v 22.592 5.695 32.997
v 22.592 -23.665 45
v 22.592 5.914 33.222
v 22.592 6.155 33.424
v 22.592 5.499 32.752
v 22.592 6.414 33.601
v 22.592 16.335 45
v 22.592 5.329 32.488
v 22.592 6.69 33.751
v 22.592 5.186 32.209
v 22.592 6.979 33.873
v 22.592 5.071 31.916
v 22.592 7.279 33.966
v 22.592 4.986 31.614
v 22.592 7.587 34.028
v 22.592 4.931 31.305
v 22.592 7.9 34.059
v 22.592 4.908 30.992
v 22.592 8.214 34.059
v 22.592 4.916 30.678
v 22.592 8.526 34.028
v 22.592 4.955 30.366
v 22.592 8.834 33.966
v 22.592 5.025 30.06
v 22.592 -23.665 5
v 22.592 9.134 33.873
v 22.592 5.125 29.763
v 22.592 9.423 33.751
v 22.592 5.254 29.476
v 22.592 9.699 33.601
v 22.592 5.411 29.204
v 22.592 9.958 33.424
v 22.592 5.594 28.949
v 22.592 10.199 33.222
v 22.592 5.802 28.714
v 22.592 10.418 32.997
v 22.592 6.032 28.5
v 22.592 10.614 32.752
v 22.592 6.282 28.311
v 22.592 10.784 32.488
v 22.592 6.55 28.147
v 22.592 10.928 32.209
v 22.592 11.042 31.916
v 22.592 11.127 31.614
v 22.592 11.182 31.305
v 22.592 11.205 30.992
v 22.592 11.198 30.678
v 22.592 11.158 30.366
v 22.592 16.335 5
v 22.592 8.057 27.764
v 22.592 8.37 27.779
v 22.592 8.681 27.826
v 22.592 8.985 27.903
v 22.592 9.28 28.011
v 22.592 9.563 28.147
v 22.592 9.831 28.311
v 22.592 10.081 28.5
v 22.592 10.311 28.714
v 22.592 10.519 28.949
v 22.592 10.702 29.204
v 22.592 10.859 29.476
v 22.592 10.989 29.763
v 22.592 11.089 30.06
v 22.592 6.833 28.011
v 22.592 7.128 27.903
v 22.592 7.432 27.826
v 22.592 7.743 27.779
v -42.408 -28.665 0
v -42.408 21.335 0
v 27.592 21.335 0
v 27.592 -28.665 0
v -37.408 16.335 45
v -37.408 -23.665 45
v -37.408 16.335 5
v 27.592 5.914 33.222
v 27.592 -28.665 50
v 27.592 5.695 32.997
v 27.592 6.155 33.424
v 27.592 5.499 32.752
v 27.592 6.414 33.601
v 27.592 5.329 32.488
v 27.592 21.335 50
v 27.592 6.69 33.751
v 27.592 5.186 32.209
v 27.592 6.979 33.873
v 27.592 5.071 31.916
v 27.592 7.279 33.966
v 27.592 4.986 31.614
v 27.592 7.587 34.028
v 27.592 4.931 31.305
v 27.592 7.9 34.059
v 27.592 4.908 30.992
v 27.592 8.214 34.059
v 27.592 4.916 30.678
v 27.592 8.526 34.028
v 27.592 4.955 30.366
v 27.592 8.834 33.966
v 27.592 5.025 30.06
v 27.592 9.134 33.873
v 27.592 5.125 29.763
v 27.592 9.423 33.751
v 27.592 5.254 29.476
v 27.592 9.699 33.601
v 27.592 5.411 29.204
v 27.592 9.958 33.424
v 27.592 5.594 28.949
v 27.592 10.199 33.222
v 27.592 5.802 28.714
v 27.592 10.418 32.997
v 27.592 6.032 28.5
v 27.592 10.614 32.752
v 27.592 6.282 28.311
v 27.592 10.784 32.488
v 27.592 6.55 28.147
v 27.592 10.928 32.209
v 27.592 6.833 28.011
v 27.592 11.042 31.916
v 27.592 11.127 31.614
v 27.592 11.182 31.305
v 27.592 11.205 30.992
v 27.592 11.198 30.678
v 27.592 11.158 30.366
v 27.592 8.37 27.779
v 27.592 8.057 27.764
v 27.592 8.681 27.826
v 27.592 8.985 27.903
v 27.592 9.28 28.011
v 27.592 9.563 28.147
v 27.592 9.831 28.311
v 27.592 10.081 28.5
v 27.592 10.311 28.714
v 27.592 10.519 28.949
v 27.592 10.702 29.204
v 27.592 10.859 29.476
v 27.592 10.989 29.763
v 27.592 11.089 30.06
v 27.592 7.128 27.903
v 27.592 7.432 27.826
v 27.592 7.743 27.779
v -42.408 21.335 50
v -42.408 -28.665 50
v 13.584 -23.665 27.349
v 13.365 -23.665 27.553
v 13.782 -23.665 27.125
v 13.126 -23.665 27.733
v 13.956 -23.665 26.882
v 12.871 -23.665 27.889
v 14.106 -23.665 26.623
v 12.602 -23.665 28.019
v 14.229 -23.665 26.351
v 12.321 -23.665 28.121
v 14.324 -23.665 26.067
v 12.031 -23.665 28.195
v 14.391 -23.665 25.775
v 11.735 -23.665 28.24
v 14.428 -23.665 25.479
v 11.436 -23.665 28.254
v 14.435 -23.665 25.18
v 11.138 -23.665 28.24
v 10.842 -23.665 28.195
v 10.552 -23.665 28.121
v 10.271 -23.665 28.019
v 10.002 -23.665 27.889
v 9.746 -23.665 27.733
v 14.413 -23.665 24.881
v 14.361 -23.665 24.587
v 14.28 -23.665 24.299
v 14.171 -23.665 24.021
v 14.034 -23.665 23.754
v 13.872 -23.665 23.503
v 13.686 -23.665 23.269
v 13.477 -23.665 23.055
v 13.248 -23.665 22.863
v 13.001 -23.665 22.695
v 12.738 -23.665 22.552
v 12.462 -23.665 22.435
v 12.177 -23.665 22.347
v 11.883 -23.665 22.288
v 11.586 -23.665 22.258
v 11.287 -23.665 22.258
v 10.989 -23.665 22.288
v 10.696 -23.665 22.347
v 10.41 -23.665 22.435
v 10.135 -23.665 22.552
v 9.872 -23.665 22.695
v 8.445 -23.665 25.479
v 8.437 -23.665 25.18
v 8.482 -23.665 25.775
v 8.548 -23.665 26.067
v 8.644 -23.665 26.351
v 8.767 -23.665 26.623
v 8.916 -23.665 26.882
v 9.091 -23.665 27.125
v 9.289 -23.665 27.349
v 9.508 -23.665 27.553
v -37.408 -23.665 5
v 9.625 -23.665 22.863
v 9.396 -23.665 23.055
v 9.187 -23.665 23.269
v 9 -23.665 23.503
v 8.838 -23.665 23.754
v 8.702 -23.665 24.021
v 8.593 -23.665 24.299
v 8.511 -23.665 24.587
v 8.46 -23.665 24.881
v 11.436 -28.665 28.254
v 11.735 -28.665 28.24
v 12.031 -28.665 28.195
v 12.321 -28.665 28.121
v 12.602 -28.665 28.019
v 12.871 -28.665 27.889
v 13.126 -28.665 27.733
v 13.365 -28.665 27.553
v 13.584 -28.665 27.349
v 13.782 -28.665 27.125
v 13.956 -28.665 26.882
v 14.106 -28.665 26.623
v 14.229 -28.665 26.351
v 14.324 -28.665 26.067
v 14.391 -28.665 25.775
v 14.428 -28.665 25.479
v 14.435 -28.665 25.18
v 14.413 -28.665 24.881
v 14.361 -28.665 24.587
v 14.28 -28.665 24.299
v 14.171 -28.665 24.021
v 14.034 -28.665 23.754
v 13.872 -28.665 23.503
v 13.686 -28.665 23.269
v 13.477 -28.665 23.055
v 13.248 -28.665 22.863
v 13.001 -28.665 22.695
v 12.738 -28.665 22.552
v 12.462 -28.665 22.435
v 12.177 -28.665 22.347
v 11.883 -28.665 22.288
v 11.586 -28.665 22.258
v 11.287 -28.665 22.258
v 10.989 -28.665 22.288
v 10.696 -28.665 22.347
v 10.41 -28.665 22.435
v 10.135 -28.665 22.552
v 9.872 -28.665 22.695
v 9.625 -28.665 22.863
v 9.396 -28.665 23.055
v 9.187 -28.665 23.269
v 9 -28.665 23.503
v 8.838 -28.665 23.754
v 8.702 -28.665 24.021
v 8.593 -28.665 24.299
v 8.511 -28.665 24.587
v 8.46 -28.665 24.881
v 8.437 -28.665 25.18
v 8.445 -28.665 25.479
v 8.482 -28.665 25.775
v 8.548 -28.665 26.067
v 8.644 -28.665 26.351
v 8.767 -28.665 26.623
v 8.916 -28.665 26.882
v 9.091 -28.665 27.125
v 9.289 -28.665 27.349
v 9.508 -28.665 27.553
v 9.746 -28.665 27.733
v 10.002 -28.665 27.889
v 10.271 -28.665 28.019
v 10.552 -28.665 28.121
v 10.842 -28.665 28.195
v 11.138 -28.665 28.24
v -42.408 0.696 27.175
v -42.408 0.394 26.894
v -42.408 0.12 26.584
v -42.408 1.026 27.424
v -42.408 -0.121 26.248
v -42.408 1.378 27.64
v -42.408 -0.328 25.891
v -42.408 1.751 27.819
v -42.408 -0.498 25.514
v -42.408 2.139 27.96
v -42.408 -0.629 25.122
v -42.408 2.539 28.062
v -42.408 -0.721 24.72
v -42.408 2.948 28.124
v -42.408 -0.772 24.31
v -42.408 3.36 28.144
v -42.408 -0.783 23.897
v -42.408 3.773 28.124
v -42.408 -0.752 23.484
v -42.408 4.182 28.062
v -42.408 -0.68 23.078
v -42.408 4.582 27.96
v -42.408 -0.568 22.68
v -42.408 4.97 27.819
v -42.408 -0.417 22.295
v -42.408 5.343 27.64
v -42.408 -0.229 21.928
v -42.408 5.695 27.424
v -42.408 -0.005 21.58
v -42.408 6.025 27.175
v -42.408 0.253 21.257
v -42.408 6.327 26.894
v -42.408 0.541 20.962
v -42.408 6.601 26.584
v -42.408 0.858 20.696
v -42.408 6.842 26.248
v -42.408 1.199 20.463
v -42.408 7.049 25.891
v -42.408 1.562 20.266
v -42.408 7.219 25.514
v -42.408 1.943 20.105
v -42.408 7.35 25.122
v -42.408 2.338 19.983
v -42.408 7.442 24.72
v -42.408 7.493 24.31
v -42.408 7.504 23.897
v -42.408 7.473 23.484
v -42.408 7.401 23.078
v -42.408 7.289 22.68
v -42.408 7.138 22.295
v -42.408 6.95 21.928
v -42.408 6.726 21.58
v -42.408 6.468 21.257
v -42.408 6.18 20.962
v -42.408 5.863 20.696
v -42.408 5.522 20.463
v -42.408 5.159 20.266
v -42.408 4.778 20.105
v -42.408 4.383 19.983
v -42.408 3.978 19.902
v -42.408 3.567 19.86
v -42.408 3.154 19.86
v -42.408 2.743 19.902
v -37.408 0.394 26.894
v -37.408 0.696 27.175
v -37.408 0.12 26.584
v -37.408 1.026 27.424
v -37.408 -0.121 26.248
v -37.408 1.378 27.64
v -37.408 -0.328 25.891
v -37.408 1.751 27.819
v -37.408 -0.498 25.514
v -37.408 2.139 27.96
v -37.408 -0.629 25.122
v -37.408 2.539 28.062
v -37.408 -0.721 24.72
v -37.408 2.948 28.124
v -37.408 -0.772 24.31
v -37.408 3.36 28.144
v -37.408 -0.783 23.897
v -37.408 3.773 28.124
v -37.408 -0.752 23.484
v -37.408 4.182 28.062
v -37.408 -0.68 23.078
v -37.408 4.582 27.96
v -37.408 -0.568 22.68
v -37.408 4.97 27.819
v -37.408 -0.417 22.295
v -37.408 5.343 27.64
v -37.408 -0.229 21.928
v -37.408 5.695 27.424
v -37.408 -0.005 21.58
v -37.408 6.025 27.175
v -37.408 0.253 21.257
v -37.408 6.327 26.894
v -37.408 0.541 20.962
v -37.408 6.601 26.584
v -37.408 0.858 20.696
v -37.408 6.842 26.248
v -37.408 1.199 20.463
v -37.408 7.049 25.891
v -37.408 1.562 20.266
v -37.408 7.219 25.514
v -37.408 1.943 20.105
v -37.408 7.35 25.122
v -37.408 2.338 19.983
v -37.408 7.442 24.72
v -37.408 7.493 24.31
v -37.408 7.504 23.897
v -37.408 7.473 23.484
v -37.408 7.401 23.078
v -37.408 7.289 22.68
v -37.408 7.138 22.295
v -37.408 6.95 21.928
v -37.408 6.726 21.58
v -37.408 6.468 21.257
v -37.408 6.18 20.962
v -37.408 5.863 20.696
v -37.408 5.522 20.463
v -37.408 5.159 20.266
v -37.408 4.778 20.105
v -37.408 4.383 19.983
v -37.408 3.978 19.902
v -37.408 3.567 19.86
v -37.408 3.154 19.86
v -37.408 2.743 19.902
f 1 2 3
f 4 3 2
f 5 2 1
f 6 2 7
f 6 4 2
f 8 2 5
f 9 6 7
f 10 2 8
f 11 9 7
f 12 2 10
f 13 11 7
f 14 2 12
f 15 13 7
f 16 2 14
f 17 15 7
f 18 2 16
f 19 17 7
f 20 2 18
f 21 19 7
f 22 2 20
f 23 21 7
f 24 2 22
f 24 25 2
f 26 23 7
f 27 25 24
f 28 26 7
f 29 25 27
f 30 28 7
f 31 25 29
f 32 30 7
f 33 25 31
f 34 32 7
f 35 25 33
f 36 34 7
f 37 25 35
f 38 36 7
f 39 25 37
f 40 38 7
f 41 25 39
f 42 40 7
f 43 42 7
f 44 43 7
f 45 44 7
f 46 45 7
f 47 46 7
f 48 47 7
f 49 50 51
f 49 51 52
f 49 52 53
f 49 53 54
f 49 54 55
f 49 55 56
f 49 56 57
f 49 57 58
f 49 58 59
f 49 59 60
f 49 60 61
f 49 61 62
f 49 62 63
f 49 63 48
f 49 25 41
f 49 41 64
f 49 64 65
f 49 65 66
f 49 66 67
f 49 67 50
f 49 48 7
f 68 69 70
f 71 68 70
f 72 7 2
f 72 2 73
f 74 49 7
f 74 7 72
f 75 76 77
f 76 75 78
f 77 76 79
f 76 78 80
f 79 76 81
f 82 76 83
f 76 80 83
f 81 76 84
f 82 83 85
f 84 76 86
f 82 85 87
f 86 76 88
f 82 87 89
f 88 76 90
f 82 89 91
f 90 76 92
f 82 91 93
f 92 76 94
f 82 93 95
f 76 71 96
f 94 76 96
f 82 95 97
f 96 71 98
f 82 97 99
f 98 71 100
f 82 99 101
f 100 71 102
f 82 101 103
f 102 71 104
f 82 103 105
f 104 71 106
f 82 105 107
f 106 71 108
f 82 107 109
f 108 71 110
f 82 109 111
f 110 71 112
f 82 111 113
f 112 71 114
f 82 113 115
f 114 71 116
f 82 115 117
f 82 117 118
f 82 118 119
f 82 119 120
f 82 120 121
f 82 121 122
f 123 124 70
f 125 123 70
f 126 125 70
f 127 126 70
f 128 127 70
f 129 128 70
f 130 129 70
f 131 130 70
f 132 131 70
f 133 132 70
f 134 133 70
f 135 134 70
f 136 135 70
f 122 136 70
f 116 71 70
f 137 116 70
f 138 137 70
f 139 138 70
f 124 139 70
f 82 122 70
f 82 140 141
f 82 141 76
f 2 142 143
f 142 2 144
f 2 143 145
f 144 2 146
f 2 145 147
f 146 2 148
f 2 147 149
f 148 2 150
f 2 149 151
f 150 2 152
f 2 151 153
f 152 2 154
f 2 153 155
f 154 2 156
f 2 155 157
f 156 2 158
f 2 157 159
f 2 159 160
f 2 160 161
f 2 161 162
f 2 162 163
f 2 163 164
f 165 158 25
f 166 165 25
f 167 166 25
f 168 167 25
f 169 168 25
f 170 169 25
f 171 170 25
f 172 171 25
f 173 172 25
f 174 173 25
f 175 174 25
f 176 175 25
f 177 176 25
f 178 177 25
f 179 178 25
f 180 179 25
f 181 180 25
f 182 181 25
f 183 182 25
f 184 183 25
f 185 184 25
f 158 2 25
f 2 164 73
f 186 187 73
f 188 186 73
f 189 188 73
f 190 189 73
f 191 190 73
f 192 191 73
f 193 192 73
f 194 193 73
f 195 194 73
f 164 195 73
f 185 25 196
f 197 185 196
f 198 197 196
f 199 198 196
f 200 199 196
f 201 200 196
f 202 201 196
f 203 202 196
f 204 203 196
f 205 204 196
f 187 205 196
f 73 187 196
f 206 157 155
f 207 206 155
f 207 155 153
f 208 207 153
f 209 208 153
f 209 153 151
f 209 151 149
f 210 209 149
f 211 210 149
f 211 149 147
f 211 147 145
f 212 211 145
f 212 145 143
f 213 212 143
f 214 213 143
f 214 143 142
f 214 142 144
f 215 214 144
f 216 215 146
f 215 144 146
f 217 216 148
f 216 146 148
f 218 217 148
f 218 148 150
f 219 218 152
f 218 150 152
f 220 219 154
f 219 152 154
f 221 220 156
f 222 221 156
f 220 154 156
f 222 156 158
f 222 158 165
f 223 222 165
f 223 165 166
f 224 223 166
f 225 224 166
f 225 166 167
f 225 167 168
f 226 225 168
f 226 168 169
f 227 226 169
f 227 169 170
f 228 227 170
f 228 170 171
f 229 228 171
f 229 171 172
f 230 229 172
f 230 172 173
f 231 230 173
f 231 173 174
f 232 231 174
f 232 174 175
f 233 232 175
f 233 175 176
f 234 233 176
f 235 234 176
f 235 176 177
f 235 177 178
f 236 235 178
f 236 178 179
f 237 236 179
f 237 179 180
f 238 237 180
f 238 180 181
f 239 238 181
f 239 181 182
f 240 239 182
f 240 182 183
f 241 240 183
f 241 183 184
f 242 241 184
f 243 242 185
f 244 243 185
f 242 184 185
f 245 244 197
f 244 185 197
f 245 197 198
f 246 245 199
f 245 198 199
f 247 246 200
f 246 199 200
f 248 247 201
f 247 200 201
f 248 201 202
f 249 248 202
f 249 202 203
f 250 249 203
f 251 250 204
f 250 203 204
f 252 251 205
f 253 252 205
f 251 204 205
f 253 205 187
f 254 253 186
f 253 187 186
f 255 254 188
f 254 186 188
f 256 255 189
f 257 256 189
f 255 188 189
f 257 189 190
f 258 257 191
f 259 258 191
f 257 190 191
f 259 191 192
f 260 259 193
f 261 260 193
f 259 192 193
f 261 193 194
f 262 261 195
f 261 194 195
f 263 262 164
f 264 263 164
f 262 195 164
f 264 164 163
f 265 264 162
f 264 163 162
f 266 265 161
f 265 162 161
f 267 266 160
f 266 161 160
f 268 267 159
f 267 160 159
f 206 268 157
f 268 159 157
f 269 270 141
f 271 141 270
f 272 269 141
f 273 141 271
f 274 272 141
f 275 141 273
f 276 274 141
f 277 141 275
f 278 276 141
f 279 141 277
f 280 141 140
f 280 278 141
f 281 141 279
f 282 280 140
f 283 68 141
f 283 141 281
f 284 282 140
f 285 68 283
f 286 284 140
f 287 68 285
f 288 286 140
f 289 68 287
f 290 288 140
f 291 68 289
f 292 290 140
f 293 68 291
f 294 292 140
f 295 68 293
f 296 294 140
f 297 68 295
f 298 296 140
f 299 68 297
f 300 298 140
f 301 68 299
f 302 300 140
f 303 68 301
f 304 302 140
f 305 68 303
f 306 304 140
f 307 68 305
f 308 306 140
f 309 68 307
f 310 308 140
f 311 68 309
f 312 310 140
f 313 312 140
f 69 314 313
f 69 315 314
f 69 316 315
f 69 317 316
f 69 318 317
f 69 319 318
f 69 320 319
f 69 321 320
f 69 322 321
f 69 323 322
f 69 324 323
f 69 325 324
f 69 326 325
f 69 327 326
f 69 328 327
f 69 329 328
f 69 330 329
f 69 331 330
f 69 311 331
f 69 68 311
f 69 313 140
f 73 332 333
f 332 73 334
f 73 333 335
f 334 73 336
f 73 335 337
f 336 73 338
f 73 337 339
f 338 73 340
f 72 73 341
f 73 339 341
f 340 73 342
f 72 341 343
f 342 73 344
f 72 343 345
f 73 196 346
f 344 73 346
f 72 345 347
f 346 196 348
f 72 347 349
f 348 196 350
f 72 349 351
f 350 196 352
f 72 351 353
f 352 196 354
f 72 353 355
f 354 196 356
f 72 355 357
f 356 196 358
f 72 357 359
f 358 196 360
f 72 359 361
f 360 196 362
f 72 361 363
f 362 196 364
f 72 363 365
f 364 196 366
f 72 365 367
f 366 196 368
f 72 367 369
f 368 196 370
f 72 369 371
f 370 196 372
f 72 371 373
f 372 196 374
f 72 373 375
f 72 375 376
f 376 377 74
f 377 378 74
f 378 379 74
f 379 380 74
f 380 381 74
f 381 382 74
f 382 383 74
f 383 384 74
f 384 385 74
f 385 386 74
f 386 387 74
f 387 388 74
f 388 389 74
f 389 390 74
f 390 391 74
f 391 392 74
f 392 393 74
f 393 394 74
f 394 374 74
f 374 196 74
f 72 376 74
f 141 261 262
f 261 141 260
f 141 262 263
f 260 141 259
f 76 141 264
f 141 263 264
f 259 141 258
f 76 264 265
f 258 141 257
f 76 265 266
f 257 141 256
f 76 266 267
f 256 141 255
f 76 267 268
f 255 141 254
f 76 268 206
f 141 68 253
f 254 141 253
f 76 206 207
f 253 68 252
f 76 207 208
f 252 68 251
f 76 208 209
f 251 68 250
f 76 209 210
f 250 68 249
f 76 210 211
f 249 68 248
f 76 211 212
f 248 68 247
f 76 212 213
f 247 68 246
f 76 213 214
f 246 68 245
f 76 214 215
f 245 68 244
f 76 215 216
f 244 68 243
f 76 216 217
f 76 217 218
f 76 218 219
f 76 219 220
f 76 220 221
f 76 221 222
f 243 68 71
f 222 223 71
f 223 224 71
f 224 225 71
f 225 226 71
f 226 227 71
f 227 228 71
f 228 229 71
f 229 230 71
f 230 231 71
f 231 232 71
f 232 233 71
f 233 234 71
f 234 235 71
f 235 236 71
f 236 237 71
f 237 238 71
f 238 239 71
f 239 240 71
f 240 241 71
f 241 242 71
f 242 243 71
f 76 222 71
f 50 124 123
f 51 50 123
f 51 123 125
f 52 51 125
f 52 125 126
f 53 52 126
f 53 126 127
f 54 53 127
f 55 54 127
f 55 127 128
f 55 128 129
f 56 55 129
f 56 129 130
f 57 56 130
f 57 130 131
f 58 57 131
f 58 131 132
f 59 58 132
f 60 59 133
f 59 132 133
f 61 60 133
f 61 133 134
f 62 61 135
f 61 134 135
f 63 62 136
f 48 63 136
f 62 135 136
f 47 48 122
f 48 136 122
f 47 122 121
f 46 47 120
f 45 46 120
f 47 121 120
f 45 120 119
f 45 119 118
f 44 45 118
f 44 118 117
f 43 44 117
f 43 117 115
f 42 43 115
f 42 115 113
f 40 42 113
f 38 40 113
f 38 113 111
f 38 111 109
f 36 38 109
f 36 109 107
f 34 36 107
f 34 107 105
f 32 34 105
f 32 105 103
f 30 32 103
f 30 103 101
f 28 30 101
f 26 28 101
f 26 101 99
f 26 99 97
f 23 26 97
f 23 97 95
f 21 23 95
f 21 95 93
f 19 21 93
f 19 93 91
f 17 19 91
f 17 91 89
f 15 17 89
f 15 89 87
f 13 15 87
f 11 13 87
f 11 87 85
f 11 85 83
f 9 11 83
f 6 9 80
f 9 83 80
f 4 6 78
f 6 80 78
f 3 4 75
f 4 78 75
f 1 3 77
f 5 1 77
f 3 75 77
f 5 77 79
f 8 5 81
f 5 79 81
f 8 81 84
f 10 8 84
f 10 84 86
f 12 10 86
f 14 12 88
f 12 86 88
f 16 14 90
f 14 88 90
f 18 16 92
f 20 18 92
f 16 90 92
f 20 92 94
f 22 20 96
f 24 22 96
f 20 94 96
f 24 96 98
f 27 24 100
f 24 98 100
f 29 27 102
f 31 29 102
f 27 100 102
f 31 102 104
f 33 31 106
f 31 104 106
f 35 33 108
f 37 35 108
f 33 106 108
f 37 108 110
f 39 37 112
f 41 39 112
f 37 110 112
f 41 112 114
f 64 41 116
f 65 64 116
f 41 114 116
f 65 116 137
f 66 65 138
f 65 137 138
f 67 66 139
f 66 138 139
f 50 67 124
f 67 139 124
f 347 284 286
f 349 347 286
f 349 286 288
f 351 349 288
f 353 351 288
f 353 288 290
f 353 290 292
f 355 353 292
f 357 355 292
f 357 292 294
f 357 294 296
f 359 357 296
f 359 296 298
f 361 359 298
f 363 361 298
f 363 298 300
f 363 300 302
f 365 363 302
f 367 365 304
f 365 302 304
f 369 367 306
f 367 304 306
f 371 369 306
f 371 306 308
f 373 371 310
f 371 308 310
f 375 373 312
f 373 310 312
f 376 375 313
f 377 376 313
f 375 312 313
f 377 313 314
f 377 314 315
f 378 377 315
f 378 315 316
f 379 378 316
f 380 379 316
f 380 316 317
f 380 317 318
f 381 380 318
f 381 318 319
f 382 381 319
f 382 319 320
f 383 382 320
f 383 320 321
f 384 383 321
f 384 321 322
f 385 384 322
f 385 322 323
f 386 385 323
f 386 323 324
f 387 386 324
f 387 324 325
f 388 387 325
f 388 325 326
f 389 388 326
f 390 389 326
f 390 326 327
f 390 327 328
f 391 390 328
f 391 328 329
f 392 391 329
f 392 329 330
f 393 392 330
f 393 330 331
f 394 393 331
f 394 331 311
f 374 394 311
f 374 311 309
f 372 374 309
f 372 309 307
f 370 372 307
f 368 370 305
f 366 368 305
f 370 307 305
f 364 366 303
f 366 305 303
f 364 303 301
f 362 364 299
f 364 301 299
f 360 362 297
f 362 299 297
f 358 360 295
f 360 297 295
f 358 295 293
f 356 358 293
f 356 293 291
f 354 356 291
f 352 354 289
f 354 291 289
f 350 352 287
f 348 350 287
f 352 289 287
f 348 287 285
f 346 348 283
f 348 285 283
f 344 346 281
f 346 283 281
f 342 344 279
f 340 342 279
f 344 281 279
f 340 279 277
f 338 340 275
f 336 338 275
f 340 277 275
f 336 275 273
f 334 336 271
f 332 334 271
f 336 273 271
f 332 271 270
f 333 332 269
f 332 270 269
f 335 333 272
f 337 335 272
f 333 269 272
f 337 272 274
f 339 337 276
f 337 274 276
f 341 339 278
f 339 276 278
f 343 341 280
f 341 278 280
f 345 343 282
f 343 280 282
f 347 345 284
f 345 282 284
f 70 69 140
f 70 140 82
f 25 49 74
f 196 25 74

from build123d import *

# Parameters (mm, degrees)
SKETCH1_W           = 70
SKETCH1_H           = 50
BOSS_EXTRUDE1_DEPTH = 50
CUT_EXTRUDE1_START  = -5
SKETCH2_W           = 60
SKETCH2_H           = 40
CUT_EXTRUDE1_DEPTH  = 40
CUT_EXTRUDE2_REACH  = 81.52
SKETCH3_R           = 3
CUT_EXTRUDE3_REACH  = 92.673
SKETCH4_R           = 3.149743794
CUT_EXTRUDE4_REACH  = 92.673
SKETCH5_R           = 4.144549467


with BuildPart() as part:
    # Sketch1 → Boss-Extrude1 (new body)
    with BuildSketch(Plane.XY):
        with Locations((-7.408376963, -3.664921466)):
            Rectangle(SKETCH1_W, SKETCH1_H)
    extrude(amount=BOSS_EXTRUDE1_DEPTH)

    # Sketch2 → Cut-Extrude1 (cut)
    with BuildSketch(Plane(origin=(0, 0, 0), x_dir=(-1, 0, 0), z_dir=(0, 0, -1)).offset(CUT_EXTRUDE1_START)):
        with Locations((7.408376963, -3.664921466)):
            Rectangle(SKETCH2_W, SKETCH2_H)
    extrude(amount=-CUT_EXTRUDE1_DEPTH, mode=Mode.SUBTRACT)

    # Sketch3 → Cut-Extrude2 (cut, up to next)
    with BuildSketch(Plane(origin=(0, -23.664921466, 0), x_dir=(1, 0, 0), z_dir=(0, 1, 0)), mode=Mode.PRIVATE) as cut_extrude2_sk1:
        with Locations(Location((11.436283644, -25.254491461, 0), (0, 0, 270))):
            Circle(SKETCH3_R)
    cut_extrude2_tool1 = extrude(cut_extrude2_sk1.sketch, amount=-CUT_EXTRUDE2_REACH, mode=Mode.PRIVATE) & part.part
    add(cut_extrude2_tool1.solids().sort_by_distance((11.436284, -23.664921, 25.254491))[0], mode=Mode.SUBTRACT)

    # Sketch4 → Cut-Extrude3 (cut, up to next)
    with BuildSketch(Plane(origin=(27.591623037, 0, 0), x_dir=(0, 0, -1), z_dir=(1, 0, 0)), mode=Mode.PRIVATE) as cut_extrude3_sk1:
        with Locations((-30.913262832, 8.056606799)):
            Circle(SKETCH4_R)
    cut_extrude3_tool1 = extrude(cut_extrude3_sk1.sketch, amount=-CUT_EXTRUDE3_REACH, mode=Mode.PRIVATE) & part.part
    add(cut_extrude3_tool1.solids().sort_by_distance((27.591623, 8.056607, 30.913263))[0], mode=Mode.SUBTRACT)

    # Sketch5 → Cut-Extrude4 (cut, up to next)
    with BuildSketch(Plane.ZY.offset(42.408376963), mode=Mode.PRIVATE) as cut_extrude4_sk1:
        with Locations((23.999844242, 3.360492079)):
            Circle(SKETCH5_R)
    cut_extrude4_tool1 = extrude(cut_extrude4_sk1.sketch, amount=-CUT_EXTRUDE4_REACH, mode=Mode.PRIVATE) & part.part
    add(cut_extrude4_tool1.solids().sort_by_distance((-42.408377, 3.360492, 23.999844))[0], mode=Mode.SUBTRACT)


solid = part.part
